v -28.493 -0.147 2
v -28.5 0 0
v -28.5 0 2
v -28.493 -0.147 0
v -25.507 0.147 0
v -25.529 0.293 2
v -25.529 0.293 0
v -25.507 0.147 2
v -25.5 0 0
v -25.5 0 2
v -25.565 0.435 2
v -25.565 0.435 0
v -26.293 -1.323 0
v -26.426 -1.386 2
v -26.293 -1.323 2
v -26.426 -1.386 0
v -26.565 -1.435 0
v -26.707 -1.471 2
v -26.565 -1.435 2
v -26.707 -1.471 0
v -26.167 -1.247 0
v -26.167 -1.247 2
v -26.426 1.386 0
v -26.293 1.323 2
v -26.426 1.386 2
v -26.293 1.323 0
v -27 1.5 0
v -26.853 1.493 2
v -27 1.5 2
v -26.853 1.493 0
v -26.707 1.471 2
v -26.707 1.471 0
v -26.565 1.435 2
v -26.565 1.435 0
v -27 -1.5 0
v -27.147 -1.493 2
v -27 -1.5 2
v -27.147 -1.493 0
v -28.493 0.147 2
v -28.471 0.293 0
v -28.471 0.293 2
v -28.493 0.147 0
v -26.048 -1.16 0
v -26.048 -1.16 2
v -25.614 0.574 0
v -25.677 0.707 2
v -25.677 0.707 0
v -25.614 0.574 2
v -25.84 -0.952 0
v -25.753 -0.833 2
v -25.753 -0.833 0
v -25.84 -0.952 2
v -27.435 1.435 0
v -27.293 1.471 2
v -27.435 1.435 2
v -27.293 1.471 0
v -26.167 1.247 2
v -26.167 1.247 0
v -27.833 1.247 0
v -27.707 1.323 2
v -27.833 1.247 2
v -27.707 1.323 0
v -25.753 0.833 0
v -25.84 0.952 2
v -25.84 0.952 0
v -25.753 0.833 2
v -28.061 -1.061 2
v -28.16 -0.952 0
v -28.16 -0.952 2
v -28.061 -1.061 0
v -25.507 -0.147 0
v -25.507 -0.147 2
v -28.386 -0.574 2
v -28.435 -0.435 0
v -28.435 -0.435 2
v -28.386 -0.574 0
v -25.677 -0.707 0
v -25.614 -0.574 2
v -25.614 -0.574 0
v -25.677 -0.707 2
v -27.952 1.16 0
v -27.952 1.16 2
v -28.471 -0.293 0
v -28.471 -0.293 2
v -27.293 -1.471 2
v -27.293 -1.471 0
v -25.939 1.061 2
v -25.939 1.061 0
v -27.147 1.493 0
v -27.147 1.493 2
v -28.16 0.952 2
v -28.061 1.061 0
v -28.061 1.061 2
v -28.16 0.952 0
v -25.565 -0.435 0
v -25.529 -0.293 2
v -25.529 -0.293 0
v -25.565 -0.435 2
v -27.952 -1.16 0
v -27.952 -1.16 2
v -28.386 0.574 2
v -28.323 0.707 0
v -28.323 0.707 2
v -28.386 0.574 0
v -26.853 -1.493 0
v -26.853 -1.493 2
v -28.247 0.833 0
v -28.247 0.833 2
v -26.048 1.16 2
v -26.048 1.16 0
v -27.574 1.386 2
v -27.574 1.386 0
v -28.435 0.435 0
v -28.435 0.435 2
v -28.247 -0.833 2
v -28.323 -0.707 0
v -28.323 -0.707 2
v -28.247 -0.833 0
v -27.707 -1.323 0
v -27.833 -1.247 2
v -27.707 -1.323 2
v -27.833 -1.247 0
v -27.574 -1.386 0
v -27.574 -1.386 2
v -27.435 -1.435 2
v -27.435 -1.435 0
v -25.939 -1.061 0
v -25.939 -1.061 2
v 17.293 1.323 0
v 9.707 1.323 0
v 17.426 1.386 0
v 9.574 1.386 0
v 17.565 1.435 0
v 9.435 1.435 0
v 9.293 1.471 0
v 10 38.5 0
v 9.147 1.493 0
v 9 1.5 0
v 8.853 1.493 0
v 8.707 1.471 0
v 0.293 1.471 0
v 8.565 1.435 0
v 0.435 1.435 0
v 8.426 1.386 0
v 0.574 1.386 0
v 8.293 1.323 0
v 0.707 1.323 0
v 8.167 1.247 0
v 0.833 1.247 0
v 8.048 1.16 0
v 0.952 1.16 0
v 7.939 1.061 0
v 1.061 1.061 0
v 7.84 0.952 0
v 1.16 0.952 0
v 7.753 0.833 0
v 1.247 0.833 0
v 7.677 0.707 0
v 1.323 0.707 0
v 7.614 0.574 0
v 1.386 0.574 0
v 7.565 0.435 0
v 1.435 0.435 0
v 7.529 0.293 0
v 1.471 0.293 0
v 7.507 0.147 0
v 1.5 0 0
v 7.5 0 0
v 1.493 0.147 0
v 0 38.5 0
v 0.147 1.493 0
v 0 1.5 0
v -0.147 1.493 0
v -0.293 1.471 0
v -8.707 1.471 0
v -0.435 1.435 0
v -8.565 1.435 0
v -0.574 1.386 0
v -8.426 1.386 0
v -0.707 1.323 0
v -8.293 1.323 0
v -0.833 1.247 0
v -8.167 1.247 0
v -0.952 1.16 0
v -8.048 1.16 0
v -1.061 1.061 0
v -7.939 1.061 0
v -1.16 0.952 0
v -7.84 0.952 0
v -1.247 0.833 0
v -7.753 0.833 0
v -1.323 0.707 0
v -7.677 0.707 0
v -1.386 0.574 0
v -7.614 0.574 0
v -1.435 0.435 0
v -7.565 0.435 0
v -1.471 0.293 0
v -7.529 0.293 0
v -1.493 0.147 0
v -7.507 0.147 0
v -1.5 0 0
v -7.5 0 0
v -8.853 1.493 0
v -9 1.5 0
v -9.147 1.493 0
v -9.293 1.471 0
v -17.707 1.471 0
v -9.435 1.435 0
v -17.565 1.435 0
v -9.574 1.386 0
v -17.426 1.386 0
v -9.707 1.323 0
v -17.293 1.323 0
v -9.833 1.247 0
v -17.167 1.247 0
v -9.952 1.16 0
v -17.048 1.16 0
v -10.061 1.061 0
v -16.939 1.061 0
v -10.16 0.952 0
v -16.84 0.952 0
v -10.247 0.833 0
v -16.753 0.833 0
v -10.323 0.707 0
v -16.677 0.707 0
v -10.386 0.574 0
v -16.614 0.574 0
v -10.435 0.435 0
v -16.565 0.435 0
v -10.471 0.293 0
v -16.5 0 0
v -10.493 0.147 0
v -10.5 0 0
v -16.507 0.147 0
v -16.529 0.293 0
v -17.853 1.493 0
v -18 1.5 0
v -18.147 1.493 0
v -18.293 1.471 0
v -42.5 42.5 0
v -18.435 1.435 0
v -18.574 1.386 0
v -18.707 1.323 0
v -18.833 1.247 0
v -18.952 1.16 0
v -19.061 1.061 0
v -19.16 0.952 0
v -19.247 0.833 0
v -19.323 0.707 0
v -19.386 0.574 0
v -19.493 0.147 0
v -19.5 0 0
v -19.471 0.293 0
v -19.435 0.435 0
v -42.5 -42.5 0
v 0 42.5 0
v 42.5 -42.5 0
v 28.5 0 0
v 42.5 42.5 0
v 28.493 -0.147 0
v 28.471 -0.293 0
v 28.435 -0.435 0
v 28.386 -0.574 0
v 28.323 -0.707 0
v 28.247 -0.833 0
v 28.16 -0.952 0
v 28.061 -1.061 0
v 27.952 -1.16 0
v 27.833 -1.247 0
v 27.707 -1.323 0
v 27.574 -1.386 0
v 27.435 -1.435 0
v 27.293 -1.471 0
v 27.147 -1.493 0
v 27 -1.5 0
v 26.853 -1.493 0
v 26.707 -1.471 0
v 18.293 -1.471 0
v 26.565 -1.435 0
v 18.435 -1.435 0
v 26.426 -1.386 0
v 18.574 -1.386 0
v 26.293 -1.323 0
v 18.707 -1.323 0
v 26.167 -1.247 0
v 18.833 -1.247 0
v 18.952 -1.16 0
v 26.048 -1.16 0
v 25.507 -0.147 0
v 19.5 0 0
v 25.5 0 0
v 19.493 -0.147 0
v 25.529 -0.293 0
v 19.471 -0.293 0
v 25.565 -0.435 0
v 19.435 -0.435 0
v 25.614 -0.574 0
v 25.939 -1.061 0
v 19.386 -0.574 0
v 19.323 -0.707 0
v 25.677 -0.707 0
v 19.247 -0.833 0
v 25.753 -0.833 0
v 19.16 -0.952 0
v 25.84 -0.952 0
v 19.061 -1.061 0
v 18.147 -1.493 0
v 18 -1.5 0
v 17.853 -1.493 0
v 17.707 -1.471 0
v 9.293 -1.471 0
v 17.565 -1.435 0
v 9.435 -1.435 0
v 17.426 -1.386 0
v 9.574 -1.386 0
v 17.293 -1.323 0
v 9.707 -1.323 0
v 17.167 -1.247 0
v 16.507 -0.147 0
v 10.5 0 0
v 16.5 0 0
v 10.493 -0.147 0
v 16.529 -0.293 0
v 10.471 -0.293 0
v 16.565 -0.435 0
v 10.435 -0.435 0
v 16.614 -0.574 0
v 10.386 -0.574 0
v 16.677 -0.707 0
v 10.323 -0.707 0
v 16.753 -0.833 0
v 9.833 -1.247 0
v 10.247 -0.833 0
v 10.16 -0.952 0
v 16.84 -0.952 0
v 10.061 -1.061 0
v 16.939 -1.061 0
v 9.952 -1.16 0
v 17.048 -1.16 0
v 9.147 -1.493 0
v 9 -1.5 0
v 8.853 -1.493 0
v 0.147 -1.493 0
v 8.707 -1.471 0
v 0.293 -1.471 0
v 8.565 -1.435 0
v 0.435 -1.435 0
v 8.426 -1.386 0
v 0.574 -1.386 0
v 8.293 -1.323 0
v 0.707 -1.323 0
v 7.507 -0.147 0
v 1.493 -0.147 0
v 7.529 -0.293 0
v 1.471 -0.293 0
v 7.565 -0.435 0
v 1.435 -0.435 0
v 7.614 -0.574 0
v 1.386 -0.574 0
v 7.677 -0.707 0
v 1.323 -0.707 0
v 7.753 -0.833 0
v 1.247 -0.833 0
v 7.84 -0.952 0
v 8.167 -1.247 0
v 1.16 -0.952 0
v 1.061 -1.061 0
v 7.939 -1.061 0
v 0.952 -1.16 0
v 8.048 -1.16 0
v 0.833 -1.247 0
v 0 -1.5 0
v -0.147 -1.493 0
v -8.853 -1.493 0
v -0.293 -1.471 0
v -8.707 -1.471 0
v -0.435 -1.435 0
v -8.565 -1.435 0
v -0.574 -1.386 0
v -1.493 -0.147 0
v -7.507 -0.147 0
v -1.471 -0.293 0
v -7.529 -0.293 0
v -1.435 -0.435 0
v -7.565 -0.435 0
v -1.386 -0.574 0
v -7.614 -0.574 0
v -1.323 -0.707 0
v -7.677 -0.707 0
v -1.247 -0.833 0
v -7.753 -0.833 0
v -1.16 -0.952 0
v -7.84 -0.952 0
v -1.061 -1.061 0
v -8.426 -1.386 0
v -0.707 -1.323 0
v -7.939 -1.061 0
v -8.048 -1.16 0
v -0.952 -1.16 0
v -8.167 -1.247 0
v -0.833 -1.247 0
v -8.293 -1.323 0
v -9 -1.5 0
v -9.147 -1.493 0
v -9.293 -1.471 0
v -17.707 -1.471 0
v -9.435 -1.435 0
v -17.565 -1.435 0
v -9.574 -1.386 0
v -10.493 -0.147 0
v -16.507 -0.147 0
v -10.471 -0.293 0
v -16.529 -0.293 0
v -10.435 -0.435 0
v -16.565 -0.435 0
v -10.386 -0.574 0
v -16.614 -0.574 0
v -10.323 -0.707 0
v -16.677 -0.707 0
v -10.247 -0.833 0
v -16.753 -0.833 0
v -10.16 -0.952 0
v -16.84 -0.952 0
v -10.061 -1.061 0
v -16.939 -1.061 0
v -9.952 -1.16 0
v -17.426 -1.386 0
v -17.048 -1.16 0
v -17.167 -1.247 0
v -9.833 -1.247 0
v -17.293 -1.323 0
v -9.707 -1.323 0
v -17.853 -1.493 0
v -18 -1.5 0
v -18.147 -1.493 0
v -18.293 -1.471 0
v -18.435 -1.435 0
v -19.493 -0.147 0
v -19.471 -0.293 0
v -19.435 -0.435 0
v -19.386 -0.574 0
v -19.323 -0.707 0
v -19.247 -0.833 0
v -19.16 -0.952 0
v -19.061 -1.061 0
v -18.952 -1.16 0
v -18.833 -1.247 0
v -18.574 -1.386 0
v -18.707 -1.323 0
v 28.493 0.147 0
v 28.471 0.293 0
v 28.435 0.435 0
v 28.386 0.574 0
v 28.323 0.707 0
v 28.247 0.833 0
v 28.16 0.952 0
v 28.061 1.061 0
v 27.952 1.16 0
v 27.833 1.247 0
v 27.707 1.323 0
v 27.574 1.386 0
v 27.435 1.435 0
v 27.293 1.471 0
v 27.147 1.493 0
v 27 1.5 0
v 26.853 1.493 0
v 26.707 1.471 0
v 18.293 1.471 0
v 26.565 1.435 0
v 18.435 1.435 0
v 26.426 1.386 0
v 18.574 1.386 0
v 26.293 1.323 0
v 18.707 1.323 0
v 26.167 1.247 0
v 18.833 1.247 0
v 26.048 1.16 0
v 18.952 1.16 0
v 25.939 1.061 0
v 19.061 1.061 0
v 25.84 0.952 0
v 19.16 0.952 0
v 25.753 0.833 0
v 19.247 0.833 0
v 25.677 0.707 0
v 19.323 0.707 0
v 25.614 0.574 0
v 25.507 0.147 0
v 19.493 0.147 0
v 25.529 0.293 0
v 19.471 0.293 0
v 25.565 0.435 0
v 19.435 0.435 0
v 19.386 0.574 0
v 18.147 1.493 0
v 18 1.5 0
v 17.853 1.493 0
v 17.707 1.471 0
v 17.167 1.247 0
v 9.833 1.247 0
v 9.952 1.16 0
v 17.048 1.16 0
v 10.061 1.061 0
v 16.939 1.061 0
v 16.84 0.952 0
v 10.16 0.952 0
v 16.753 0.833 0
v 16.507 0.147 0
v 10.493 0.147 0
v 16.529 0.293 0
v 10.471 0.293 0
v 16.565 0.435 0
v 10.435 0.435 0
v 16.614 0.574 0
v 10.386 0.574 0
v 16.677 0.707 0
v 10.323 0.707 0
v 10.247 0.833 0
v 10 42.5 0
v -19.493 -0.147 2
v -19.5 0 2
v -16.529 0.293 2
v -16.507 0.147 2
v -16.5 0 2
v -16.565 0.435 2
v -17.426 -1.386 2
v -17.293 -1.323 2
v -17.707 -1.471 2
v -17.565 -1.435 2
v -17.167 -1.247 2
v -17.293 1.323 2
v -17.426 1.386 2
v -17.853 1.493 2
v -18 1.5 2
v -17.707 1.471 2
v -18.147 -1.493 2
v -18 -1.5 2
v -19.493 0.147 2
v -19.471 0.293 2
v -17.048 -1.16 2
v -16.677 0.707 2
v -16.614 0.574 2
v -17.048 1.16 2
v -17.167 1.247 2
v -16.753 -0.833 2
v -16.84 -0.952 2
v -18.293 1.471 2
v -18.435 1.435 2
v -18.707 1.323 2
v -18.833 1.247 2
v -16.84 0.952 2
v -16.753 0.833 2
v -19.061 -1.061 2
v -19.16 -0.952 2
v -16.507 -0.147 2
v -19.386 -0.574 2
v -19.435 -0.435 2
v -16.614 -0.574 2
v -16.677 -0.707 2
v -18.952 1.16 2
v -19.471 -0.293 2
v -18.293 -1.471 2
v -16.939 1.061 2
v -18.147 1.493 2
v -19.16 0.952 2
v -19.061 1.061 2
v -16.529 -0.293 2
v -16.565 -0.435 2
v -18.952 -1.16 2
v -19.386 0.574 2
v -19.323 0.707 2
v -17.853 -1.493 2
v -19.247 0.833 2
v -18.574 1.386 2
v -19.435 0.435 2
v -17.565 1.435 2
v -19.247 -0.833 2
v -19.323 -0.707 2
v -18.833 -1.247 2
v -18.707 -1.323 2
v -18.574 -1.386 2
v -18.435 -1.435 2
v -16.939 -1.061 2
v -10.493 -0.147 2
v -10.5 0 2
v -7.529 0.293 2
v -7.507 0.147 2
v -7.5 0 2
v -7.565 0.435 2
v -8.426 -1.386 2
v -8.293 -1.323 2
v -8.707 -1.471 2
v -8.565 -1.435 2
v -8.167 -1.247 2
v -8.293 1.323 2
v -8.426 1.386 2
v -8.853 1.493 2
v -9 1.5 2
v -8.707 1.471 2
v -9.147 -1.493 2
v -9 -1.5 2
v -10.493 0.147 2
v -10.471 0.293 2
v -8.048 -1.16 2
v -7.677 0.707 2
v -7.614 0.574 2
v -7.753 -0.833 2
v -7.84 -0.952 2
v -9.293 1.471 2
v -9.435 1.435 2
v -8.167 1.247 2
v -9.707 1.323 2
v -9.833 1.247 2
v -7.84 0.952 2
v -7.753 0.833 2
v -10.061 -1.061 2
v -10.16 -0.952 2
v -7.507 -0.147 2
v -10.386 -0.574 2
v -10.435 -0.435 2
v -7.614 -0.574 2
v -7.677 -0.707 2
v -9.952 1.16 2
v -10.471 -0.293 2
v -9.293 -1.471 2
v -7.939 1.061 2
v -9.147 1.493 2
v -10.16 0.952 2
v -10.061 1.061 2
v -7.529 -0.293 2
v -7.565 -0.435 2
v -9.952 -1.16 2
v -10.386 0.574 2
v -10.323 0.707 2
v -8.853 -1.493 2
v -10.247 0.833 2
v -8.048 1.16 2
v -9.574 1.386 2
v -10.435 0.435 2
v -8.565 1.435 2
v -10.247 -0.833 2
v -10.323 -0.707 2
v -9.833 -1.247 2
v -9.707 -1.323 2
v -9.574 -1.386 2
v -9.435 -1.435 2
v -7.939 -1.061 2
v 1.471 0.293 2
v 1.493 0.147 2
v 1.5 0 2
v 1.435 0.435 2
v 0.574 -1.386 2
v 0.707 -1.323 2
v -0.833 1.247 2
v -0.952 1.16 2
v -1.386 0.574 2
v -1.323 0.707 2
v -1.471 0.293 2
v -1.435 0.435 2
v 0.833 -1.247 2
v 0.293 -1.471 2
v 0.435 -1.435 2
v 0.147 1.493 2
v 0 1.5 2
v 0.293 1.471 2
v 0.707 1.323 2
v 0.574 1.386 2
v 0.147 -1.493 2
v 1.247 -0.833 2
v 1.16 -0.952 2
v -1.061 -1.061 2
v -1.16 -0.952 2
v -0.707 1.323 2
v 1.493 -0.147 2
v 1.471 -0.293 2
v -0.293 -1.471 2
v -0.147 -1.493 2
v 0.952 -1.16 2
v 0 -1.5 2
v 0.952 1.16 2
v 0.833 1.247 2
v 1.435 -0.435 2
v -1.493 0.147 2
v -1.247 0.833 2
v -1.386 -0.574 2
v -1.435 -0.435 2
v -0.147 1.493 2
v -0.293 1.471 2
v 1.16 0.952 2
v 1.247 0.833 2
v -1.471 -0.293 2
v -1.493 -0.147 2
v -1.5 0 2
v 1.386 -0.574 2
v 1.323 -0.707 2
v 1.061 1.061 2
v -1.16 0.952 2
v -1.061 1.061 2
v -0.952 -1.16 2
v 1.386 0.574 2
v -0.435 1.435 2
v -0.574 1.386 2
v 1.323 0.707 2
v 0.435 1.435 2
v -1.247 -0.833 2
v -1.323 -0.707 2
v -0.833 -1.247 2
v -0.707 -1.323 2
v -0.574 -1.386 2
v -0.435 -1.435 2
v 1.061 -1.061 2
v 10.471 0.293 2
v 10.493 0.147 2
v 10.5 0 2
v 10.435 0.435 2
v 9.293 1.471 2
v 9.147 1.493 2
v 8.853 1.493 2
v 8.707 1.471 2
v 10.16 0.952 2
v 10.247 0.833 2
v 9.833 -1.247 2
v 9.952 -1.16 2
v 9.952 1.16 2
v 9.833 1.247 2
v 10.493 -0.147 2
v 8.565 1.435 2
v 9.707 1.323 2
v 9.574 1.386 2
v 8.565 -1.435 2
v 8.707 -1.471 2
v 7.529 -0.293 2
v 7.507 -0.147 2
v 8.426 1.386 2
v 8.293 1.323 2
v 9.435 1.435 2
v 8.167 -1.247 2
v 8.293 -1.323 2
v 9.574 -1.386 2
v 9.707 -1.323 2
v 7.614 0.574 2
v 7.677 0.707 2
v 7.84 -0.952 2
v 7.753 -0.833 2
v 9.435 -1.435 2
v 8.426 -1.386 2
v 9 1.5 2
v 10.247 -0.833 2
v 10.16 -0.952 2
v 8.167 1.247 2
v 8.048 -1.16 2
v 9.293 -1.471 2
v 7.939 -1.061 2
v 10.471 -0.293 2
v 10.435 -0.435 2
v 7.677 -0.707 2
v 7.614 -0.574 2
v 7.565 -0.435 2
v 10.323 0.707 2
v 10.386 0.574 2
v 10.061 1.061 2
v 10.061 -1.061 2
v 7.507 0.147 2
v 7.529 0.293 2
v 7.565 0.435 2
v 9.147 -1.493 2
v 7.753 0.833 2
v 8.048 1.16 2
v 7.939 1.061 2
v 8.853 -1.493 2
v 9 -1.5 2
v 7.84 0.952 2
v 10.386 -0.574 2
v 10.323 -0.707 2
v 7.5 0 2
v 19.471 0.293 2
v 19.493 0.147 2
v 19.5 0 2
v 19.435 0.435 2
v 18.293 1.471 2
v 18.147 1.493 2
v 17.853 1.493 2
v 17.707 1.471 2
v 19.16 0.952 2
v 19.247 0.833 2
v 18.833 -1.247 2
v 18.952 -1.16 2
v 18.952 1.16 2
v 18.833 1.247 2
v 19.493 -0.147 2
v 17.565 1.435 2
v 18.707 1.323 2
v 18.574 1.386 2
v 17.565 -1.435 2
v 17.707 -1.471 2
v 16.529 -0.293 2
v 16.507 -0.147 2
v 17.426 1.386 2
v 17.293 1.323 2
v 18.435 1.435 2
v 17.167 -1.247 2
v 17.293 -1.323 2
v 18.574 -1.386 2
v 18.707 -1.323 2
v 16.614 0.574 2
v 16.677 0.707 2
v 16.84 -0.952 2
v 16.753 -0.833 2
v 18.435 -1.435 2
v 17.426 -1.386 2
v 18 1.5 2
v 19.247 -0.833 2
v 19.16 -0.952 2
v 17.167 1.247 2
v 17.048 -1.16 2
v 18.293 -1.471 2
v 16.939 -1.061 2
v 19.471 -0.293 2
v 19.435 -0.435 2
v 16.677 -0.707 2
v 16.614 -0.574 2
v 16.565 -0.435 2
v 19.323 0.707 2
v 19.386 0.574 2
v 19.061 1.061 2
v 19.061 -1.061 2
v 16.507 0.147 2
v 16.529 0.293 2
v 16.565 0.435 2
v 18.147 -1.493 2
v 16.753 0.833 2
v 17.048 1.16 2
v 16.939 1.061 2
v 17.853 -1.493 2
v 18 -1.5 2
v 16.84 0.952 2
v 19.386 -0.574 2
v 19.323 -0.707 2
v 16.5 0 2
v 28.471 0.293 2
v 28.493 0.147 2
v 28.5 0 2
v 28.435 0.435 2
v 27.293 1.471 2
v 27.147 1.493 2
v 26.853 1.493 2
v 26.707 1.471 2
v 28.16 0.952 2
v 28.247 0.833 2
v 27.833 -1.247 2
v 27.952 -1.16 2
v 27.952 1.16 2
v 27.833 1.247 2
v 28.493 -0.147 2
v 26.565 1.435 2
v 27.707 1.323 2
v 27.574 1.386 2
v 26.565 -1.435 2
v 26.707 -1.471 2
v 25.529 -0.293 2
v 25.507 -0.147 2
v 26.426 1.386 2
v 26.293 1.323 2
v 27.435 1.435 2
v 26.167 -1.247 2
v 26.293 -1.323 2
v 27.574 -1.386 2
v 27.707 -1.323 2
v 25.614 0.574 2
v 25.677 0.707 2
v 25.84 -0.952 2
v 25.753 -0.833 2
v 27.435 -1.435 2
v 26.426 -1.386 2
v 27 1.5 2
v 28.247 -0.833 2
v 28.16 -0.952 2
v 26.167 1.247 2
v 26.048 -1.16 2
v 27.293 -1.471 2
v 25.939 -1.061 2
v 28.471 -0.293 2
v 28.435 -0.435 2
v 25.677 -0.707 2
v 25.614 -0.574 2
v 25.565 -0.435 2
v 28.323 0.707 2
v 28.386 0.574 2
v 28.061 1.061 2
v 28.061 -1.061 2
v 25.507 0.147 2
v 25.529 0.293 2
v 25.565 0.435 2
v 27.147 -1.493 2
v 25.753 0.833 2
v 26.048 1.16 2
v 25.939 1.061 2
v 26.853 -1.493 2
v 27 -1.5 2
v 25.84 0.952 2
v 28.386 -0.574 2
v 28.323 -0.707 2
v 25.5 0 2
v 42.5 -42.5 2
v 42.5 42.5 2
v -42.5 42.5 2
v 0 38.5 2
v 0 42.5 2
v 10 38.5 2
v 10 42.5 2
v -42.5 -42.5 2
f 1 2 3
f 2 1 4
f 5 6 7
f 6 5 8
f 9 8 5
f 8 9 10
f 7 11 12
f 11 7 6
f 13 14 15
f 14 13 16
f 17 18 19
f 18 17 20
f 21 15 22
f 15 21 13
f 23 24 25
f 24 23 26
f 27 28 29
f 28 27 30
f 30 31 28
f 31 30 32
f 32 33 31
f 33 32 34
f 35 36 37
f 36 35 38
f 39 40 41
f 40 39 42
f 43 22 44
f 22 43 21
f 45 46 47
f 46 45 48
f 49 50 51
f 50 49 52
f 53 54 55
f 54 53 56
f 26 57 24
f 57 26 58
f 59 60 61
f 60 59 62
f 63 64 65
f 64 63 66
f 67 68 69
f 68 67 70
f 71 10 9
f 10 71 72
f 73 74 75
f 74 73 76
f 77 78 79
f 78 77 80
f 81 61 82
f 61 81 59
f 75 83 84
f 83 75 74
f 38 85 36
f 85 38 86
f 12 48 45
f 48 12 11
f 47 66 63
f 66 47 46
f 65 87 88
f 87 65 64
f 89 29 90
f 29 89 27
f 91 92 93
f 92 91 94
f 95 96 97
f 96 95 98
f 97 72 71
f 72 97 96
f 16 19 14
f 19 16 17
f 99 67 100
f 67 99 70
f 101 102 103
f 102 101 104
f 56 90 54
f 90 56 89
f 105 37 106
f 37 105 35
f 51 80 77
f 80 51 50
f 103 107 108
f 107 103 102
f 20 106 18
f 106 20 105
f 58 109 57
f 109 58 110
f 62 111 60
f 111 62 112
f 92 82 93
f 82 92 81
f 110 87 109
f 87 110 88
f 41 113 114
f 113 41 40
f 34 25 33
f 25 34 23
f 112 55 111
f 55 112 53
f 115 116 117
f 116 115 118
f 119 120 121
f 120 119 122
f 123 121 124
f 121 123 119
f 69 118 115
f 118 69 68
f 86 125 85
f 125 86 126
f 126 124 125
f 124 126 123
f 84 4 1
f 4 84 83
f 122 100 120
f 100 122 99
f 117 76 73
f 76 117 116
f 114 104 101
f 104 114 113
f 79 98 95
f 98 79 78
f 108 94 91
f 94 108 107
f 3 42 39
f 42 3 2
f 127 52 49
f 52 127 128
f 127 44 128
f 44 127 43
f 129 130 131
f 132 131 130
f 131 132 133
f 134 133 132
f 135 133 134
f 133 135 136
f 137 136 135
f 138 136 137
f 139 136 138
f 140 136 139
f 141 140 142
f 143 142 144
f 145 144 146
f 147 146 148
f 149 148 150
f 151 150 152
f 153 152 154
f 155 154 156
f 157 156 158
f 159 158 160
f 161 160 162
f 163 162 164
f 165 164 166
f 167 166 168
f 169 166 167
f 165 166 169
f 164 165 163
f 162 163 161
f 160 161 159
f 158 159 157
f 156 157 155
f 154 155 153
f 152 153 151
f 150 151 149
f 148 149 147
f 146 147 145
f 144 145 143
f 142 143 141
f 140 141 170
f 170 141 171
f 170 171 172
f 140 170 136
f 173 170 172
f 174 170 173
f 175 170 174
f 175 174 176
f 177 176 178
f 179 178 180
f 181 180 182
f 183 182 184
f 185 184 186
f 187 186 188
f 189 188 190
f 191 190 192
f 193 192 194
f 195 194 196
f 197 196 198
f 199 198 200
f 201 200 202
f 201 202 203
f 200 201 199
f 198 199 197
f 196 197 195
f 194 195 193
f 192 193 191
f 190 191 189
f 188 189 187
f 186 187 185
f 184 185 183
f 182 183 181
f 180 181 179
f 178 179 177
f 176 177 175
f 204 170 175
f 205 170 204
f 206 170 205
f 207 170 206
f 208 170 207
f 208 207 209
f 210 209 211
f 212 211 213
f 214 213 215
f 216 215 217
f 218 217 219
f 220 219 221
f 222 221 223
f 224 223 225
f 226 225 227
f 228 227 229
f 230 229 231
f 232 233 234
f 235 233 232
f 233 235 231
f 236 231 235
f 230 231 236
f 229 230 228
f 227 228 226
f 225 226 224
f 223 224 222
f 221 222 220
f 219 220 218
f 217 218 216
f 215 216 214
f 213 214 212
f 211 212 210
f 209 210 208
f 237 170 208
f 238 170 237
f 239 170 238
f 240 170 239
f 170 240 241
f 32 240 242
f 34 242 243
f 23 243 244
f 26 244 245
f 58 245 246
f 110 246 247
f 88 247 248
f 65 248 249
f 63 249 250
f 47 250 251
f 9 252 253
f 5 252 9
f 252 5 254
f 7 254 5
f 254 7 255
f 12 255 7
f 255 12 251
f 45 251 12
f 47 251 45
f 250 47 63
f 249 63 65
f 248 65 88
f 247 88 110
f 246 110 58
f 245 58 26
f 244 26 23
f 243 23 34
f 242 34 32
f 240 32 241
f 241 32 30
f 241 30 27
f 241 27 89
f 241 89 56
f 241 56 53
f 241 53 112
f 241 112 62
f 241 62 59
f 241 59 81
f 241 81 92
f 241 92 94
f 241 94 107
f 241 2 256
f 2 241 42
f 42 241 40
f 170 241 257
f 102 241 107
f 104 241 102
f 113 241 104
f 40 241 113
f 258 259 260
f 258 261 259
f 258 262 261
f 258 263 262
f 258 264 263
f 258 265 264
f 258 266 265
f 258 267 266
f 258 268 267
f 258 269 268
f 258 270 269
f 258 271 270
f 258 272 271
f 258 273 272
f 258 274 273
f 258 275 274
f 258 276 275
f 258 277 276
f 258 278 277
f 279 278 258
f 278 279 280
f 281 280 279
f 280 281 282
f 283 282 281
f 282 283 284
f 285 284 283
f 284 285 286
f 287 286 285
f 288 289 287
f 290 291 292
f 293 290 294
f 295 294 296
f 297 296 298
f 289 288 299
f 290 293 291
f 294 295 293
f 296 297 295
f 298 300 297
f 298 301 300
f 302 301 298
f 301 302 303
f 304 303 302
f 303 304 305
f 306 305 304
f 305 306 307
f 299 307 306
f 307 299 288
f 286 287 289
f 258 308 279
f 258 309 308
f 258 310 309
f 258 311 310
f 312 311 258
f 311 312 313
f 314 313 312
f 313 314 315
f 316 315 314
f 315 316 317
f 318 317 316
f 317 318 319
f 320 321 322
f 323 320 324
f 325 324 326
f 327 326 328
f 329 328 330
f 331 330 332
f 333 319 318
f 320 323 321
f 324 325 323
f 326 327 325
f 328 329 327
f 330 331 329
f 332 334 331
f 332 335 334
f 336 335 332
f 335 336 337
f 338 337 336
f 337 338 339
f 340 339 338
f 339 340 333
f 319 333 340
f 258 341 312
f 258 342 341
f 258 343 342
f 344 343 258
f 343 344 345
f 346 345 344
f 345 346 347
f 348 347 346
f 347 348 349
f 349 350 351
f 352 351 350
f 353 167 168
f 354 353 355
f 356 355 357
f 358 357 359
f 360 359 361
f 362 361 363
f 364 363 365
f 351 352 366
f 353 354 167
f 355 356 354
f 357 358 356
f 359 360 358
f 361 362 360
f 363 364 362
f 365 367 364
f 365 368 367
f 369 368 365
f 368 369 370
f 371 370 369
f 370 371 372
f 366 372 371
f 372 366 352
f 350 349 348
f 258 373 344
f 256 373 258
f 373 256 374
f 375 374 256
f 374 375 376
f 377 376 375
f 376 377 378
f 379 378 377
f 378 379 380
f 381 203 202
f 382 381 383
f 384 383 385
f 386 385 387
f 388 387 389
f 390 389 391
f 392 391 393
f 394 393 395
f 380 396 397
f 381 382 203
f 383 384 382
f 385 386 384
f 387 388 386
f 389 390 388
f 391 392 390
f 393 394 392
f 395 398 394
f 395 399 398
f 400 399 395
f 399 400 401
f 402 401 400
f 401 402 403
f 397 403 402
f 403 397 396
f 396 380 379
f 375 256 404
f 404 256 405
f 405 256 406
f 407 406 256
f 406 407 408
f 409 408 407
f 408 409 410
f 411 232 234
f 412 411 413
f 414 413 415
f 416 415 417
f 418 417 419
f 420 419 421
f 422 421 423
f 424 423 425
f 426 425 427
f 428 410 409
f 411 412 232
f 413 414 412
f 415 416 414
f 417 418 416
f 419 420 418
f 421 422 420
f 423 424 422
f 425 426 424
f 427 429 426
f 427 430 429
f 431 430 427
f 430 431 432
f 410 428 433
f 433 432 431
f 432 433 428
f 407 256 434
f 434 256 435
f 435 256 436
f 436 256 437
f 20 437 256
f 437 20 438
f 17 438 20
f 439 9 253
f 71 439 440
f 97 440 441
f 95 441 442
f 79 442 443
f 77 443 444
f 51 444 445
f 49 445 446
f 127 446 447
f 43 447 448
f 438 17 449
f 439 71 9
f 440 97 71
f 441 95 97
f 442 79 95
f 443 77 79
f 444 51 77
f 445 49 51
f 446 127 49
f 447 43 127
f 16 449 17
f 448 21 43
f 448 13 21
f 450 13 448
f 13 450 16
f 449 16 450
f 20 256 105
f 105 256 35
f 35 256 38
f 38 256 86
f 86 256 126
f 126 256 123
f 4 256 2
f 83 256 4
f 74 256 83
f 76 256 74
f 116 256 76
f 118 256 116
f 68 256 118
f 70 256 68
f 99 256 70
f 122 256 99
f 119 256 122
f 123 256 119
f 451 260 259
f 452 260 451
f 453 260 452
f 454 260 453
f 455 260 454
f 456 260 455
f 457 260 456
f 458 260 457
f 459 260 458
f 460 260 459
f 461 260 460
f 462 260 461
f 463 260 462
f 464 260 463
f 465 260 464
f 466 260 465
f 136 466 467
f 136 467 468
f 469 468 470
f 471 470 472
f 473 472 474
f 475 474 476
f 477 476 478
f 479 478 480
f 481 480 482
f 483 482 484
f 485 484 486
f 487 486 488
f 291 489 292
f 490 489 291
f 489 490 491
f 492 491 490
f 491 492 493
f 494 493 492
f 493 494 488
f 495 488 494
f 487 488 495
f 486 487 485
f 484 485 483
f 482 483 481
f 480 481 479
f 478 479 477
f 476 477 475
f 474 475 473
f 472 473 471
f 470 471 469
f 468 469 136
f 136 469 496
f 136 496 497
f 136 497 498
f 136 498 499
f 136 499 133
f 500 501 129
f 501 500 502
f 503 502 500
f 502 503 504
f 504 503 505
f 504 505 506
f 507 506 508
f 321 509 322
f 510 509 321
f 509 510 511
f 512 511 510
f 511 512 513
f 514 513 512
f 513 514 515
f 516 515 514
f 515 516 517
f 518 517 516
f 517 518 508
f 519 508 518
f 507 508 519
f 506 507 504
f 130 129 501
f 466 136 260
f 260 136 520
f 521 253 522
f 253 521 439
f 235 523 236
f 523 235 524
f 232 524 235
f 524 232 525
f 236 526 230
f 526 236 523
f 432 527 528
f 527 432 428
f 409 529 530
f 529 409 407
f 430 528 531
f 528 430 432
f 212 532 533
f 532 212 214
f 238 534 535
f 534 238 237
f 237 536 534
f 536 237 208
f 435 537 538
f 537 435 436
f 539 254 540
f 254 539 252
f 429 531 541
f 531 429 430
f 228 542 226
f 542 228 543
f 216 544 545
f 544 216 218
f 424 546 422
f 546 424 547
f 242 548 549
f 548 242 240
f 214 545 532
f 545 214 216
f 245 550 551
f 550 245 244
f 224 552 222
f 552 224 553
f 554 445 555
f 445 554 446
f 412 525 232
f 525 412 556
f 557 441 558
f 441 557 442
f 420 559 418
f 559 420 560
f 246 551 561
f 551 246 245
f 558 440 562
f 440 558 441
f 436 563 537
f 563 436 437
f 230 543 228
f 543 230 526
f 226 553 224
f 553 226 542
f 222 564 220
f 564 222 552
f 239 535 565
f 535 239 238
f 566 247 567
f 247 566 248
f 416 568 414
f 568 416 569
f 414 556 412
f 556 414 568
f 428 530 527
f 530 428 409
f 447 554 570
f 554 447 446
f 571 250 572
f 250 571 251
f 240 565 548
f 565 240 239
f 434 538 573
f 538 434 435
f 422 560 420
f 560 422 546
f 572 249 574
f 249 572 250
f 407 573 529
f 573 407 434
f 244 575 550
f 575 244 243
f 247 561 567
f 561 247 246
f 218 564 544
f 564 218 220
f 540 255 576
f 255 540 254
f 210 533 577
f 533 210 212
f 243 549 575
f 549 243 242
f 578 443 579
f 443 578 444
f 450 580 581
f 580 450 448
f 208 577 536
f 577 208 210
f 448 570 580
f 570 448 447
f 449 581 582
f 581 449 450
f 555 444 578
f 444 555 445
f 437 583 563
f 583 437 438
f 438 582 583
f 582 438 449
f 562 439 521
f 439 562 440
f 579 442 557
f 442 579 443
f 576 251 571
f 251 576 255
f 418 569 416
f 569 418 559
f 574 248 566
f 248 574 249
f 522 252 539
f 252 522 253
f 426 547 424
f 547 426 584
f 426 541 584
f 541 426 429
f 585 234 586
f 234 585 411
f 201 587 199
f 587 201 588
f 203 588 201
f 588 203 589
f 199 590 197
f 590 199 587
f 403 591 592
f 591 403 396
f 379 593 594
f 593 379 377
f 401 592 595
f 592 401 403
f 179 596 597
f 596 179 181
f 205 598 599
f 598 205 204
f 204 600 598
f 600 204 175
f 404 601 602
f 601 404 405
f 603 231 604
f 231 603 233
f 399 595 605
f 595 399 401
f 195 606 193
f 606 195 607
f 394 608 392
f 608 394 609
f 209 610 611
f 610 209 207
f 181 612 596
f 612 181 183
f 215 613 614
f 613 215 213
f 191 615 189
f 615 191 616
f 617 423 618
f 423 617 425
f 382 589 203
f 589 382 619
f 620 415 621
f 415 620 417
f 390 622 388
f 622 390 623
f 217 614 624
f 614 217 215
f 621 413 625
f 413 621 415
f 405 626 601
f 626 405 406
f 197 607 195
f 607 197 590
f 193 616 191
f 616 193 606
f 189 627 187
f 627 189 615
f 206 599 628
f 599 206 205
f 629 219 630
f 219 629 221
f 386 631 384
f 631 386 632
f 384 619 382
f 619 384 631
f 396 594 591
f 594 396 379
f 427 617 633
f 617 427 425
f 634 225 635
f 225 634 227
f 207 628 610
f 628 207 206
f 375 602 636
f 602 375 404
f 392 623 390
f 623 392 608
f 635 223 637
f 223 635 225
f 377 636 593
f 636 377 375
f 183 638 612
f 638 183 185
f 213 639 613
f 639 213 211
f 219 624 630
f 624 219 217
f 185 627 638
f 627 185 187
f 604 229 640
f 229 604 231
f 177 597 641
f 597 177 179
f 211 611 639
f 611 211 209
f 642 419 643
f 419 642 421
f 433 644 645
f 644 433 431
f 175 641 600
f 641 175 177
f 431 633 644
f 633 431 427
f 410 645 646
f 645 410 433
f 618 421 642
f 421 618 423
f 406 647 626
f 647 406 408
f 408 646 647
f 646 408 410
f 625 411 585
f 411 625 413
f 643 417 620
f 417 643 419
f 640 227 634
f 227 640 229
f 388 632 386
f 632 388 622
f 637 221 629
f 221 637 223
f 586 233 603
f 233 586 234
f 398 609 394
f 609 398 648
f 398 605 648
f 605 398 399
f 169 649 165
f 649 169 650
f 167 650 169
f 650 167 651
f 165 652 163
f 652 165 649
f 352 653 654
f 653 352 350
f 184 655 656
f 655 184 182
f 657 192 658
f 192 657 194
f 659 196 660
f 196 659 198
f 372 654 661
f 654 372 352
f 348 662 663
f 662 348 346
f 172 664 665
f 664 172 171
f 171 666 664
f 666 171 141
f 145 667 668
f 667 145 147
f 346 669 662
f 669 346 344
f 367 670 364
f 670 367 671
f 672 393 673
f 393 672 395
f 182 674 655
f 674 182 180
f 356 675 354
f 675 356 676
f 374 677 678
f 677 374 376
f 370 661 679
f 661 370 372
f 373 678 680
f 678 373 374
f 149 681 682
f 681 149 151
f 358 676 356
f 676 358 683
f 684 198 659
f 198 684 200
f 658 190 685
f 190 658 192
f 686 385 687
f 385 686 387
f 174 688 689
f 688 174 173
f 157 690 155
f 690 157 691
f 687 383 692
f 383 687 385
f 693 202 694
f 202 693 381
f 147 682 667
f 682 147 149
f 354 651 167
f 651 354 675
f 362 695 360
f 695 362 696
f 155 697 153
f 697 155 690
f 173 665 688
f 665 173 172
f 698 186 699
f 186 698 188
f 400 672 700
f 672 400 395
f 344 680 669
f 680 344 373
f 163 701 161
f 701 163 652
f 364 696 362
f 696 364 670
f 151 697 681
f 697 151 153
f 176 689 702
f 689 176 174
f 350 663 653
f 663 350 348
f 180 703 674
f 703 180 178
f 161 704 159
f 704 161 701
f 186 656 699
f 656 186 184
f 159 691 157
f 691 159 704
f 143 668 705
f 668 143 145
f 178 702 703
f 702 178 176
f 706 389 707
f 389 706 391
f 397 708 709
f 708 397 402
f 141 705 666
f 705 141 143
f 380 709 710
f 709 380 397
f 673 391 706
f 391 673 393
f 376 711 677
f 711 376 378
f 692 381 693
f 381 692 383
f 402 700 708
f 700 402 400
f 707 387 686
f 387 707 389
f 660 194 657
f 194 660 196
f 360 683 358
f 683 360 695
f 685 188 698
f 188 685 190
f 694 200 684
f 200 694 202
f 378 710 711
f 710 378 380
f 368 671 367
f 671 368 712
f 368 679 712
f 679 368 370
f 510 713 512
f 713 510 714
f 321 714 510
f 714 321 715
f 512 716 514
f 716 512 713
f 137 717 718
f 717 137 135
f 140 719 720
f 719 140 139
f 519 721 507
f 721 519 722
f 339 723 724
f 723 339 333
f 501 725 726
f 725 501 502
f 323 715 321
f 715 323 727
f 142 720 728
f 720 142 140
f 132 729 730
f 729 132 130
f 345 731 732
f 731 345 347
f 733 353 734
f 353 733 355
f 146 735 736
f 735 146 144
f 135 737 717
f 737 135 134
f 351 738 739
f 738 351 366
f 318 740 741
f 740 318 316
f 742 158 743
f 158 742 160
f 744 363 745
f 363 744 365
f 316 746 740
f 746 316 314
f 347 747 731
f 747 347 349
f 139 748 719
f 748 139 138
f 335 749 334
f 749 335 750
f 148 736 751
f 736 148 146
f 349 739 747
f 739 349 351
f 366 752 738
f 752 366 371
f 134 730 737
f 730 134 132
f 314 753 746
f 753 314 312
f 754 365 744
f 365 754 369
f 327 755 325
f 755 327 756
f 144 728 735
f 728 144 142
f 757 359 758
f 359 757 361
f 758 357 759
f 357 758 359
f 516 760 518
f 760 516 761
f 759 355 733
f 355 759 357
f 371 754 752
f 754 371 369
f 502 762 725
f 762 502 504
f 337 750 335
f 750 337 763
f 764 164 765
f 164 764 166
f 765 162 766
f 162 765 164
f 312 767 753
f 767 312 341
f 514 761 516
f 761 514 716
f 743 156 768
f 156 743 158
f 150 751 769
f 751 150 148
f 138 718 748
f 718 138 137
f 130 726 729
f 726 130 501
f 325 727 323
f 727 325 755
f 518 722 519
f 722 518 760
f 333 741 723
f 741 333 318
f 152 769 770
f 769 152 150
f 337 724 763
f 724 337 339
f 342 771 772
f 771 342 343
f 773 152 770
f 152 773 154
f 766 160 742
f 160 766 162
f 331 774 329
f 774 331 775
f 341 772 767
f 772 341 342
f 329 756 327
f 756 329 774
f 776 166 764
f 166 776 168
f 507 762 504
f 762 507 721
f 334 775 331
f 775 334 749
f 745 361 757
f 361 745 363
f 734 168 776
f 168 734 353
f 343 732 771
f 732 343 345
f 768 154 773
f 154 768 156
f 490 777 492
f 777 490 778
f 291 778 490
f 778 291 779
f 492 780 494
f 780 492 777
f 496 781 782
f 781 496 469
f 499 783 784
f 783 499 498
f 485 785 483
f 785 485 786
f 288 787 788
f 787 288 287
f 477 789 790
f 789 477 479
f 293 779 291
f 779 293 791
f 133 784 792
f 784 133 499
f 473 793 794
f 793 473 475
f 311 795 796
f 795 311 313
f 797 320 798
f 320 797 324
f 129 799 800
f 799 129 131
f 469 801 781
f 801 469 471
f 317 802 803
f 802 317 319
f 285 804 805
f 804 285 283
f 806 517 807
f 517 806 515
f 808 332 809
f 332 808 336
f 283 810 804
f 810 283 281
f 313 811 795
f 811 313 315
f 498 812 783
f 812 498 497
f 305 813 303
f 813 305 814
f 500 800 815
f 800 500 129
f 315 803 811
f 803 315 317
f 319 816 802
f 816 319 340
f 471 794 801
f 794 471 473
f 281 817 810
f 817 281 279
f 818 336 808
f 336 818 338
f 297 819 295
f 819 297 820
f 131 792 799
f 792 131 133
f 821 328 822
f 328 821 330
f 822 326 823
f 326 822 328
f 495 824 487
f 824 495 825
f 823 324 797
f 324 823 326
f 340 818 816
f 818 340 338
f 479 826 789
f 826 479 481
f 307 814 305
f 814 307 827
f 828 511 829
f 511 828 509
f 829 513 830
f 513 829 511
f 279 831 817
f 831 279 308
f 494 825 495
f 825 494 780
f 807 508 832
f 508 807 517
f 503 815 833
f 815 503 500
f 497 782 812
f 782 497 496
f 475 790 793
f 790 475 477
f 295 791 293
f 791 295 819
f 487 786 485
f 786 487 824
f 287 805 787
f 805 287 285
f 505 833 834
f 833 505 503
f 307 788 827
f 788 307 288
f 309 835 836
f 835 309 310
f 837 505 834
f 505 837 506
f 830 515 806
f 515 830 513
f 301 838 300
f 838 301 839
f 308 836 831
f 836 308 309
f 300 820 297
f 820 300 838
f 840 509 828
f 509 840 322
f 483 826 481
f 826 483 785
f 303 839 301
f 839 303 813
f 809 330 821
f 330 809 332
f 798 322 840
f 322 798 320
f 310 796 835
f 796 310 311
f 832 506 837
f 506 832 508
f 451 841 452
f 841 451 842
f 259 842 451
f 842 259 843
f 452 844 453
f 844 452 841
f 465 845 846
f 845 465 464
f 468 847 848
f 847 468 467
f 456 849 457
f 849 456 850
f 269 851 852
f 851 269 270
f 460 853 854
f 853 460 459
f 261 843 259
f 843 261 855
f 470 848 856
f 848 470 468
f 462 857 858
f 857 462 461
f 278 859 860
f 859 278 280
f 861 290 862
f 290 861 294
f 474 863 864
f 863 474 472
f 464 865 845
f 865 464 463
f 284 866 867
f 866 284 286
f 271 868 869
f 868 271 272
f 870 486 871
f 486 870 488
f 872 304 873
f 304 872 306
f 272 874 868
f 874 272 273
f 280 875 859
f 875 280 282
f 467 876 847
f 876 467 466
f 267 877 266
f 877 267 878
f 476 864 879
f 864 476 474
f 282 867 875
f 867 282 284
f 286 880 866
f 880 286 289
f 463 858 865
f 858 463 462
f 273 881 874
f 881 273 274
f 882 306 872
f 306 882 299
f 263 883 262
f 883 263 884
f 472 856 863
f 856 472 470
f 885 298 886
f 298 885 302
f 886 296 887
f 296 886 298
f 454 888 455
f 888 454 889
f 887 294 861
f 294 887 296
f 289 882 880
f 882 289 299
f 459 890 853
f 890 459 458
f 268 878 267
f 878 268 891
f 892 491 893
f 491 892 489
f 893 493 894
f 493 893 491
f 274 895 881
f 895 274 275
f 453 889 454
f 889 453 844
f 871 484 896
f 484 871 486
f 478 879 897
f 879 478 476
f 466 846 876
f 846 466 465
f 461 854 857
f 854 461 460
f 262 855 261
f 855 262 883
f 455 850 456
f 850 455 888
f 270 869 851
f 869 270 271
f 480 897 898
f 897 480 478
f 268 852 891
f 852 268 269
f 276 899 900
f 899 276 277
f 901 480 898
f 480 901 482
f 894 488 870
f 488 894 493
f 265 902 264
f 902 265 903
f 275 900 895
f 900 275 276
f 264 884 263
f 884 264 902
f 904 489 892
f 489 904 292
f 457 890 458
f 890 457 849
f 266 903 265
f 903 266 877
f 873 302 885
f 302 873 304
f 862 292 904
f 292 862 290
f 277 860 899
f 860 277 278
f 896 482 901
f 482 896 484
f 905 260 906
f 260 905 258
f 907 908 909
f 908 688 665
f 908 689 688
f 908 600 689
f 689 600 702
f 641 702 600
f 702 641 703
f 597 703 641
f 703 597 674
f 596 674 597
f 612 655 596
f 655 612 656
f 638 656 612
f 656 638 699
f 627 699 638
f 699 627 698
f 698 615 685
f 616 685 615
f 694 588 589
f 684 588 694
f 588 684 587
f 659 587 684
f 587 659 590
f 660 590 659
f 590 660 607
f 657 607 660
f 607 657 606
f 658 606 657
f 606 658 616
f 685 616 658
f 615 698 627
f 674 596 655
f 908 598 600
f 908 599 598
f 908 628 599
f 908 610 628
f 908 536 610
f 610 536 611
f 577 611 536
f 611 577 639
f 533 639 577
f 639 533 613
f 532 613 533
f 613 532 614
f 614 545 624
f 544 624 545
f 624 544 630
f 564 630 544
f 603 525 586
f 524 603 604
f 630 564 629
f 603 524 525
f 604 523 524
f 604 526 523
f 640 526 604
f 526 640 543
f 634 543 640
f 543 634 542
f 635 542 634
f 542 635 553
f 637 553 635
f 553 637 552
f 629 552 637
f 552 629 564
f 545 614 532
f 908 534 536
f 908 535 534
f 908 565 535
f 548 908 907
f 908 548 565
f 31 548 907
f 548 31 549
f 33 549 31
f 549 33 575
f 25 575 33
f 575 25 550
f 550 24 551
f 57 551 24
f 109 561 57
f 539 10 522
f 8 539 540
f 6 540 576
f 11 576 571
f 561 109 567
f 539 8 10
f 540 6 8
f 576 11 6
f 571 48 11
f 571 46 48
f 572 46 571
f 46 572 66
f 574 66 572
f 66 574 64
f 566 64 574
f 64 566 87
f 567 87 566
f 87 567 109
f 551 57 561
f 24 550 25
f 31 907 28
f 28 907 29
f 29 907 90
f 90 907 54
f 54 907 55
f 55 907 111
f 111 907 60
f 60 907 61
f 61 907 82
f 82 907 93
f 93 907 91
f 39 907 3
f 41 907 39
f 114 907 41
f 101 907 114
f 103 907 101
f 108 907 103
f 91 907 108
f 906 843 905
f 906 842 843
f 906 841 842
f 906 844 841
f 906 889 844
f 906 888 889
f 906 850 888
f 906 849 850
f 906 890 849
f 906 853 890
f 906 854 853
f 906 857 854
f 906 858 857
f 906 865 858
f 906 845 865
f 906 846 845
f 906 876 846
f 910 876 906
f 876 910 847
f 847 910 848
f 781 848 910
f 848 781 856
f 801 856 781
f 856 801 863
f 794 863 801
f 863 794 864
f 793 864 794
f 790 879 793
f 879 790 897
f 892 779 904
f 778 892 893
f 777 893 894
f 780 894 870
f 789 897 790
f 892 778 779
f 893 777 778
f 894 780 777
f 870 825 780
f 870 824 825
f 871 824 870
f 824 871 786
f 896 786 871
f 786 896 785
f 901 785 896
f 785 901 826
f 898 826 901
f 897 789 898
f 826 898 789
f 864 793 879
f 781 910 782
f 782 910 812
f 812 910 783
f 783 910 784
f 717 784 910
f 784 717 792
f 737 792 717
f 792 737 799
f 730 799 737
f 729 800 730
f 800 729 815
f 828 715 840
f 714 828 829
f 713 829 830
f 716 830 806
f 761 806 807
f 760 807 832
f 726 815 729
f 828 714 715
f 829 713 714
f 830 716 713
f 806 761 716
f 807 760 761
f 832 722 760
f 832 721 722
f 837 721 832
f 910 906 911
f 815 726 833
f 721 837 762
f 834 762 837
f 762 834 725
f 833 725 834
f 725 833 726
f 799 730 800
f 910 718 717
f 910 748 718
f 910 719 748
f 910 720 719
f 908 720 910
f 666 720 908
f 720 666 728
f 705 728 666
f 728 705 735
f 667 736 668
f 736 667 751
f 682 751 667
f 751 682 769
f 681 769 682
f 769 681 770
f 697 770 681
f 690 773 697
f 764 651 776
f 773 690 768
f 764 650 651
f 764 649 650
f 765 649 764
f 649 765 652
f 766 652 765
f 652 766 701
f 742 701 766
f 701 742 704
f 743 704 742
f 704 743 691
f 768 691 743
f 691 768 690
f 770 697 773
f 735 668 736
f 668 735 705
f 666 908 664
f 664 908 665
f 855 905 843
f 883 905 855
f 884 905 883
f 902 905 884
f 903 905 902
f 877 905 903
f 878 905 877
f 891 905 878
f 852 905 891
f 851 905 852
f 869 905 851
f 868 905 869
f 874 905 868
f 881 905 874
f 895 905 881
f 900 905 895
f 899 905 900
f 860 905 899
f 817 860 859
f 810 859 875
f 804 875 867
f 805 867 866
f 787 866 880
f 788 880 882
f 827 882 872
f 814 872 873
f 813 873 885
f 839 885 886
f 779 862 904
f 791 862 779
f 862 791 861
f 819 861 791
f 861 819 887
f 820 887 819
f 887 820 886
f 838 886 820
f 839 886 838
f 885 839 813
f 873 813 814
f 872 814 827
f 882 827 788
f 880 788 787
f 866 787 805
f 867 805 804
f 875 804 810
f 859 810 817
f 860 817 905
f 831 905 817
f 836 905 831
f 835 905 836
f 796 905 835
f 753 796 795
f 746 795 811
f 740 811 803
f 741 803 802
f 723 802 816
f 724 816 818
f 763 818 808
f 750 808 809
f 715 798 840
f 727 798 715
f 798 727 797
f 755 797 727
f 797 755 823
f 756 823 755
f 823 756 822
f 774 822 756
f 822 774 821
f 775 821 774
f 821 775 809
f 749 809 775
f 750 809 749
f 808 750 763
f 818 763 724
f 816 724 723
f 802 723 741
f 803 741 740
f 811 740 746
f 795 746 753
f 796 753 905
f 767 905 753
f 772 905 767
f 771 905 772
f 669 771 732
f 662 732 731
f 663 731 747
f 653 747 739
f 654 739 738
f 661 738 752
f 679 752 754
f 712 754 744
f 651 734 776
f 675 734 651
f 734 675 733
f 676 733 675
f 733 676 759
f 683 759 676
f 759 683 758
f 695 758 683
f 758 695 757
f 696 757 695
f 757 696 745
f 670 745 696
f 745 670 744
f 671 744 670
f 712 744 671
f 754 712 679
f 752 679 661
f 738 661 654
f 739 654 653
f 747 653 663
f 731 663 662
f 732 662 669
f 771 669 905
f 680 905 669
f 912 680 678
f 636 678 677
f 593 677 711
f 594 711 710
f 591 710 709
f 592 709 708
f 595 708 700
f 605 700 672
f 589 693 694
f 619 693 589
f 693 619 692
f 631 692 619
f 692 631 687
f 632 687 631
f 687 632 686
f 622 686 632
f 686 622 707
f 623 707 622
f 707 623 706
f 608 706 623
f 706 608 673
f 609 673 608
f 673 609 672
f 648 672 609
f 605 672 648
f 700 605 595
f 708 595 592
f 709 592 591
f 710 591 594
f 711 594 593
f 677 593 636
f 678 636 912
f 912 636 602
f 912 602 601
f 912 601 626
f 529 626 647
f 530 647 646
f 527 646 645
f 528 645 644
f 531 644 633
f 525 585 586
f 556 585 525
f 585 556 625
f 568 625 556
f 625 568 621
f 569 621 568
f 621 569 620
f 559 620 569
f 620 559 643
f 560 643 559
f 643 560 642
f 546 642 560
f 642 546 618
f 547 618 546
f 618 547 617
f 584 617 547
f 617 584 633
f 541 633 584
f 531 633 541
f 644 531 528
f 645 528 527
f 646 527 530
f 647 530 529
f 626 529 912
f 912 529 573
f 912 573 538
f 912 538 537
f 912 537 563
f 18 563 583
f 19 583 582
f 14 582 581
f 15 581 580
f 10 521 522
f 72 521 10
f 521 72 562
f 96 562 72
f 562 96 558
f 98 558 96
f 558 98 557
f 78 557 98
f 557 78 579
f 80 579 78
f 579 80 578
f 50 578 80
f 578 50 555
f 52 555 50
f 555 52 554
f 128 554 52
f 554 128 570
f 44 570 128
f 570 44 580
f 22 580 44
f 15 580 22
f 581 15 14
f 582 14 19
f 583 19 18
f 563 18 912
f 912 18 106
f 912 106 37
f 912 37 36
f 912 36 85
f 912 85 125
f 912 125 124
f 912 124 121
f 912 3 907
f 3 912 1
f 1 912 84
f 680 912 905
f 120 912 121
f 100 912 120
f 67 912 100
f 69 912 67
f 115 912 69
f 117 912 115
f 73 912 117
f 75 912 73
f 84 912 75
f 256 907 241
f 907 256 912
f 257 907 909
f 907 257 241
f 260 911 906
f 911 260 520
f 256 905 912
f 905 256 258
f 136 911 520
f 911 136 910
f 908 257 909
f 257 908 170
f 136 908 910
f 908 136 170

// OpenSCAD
// Sowing template for 90mm Petri dish: flat disc with grid of holes and orientation notch.

// Dimensions
DISH_DIA = 90;
DISC_DIA = 85;
THICKNESS = 2;
HOLE_COUNT = 7;
HOLE_DIA = 3;
HOLE_SPACING = 9;
NOTCH_WIDTH = 10;
NOTCH_DEPTH = 4;

$fn = 64;

// Calculate grid offsets to centre the grid on the origin
// For 7 holes, indices are 0..6. Centre index is 3.
// Offset = (index - 3) * spacing
grid_offset = (HOLE_COUNT - 1) / 2 * HOLE_SPACING;

difference() {
    // Main disc body
    translate([-DISC_DIA / 2, -DISC_DIA / 2, 0])
        cube([DISC_DIA, DISC_DIA, THICKNESS]);

    // Grid of holes
    for (i = [0 : HOLE_COUNT - 1]) {
        x_pos = (i - (HOLE_COUNT - 1) / 2) * HOLE_SPACING;
        translate([x_pos, 0, 0])
            cylinder(h = THICKNESS + 0.1, d = HOLE_DIA);
    }

    // Orientation notch on the +Y side
    // Notch is 10mm wide (X) and 4mm deep (Y)
    // Centred on Y axis, so it spans from -5 to +5 in X
    // It cuts into the rim from the outside inwards
    translate([0, DISC_DIA / 2 - NOTCH_DEPTH, 0]) {
        // Cut a rectangle that extends slightly past the rim to ensure clean cut
        translate([0, 0, -0.1])
            cube([NOTCH_WIDTH, NOTCH_DEPTH + 0.1, THICKNESS + 0.1]);
    }
}
